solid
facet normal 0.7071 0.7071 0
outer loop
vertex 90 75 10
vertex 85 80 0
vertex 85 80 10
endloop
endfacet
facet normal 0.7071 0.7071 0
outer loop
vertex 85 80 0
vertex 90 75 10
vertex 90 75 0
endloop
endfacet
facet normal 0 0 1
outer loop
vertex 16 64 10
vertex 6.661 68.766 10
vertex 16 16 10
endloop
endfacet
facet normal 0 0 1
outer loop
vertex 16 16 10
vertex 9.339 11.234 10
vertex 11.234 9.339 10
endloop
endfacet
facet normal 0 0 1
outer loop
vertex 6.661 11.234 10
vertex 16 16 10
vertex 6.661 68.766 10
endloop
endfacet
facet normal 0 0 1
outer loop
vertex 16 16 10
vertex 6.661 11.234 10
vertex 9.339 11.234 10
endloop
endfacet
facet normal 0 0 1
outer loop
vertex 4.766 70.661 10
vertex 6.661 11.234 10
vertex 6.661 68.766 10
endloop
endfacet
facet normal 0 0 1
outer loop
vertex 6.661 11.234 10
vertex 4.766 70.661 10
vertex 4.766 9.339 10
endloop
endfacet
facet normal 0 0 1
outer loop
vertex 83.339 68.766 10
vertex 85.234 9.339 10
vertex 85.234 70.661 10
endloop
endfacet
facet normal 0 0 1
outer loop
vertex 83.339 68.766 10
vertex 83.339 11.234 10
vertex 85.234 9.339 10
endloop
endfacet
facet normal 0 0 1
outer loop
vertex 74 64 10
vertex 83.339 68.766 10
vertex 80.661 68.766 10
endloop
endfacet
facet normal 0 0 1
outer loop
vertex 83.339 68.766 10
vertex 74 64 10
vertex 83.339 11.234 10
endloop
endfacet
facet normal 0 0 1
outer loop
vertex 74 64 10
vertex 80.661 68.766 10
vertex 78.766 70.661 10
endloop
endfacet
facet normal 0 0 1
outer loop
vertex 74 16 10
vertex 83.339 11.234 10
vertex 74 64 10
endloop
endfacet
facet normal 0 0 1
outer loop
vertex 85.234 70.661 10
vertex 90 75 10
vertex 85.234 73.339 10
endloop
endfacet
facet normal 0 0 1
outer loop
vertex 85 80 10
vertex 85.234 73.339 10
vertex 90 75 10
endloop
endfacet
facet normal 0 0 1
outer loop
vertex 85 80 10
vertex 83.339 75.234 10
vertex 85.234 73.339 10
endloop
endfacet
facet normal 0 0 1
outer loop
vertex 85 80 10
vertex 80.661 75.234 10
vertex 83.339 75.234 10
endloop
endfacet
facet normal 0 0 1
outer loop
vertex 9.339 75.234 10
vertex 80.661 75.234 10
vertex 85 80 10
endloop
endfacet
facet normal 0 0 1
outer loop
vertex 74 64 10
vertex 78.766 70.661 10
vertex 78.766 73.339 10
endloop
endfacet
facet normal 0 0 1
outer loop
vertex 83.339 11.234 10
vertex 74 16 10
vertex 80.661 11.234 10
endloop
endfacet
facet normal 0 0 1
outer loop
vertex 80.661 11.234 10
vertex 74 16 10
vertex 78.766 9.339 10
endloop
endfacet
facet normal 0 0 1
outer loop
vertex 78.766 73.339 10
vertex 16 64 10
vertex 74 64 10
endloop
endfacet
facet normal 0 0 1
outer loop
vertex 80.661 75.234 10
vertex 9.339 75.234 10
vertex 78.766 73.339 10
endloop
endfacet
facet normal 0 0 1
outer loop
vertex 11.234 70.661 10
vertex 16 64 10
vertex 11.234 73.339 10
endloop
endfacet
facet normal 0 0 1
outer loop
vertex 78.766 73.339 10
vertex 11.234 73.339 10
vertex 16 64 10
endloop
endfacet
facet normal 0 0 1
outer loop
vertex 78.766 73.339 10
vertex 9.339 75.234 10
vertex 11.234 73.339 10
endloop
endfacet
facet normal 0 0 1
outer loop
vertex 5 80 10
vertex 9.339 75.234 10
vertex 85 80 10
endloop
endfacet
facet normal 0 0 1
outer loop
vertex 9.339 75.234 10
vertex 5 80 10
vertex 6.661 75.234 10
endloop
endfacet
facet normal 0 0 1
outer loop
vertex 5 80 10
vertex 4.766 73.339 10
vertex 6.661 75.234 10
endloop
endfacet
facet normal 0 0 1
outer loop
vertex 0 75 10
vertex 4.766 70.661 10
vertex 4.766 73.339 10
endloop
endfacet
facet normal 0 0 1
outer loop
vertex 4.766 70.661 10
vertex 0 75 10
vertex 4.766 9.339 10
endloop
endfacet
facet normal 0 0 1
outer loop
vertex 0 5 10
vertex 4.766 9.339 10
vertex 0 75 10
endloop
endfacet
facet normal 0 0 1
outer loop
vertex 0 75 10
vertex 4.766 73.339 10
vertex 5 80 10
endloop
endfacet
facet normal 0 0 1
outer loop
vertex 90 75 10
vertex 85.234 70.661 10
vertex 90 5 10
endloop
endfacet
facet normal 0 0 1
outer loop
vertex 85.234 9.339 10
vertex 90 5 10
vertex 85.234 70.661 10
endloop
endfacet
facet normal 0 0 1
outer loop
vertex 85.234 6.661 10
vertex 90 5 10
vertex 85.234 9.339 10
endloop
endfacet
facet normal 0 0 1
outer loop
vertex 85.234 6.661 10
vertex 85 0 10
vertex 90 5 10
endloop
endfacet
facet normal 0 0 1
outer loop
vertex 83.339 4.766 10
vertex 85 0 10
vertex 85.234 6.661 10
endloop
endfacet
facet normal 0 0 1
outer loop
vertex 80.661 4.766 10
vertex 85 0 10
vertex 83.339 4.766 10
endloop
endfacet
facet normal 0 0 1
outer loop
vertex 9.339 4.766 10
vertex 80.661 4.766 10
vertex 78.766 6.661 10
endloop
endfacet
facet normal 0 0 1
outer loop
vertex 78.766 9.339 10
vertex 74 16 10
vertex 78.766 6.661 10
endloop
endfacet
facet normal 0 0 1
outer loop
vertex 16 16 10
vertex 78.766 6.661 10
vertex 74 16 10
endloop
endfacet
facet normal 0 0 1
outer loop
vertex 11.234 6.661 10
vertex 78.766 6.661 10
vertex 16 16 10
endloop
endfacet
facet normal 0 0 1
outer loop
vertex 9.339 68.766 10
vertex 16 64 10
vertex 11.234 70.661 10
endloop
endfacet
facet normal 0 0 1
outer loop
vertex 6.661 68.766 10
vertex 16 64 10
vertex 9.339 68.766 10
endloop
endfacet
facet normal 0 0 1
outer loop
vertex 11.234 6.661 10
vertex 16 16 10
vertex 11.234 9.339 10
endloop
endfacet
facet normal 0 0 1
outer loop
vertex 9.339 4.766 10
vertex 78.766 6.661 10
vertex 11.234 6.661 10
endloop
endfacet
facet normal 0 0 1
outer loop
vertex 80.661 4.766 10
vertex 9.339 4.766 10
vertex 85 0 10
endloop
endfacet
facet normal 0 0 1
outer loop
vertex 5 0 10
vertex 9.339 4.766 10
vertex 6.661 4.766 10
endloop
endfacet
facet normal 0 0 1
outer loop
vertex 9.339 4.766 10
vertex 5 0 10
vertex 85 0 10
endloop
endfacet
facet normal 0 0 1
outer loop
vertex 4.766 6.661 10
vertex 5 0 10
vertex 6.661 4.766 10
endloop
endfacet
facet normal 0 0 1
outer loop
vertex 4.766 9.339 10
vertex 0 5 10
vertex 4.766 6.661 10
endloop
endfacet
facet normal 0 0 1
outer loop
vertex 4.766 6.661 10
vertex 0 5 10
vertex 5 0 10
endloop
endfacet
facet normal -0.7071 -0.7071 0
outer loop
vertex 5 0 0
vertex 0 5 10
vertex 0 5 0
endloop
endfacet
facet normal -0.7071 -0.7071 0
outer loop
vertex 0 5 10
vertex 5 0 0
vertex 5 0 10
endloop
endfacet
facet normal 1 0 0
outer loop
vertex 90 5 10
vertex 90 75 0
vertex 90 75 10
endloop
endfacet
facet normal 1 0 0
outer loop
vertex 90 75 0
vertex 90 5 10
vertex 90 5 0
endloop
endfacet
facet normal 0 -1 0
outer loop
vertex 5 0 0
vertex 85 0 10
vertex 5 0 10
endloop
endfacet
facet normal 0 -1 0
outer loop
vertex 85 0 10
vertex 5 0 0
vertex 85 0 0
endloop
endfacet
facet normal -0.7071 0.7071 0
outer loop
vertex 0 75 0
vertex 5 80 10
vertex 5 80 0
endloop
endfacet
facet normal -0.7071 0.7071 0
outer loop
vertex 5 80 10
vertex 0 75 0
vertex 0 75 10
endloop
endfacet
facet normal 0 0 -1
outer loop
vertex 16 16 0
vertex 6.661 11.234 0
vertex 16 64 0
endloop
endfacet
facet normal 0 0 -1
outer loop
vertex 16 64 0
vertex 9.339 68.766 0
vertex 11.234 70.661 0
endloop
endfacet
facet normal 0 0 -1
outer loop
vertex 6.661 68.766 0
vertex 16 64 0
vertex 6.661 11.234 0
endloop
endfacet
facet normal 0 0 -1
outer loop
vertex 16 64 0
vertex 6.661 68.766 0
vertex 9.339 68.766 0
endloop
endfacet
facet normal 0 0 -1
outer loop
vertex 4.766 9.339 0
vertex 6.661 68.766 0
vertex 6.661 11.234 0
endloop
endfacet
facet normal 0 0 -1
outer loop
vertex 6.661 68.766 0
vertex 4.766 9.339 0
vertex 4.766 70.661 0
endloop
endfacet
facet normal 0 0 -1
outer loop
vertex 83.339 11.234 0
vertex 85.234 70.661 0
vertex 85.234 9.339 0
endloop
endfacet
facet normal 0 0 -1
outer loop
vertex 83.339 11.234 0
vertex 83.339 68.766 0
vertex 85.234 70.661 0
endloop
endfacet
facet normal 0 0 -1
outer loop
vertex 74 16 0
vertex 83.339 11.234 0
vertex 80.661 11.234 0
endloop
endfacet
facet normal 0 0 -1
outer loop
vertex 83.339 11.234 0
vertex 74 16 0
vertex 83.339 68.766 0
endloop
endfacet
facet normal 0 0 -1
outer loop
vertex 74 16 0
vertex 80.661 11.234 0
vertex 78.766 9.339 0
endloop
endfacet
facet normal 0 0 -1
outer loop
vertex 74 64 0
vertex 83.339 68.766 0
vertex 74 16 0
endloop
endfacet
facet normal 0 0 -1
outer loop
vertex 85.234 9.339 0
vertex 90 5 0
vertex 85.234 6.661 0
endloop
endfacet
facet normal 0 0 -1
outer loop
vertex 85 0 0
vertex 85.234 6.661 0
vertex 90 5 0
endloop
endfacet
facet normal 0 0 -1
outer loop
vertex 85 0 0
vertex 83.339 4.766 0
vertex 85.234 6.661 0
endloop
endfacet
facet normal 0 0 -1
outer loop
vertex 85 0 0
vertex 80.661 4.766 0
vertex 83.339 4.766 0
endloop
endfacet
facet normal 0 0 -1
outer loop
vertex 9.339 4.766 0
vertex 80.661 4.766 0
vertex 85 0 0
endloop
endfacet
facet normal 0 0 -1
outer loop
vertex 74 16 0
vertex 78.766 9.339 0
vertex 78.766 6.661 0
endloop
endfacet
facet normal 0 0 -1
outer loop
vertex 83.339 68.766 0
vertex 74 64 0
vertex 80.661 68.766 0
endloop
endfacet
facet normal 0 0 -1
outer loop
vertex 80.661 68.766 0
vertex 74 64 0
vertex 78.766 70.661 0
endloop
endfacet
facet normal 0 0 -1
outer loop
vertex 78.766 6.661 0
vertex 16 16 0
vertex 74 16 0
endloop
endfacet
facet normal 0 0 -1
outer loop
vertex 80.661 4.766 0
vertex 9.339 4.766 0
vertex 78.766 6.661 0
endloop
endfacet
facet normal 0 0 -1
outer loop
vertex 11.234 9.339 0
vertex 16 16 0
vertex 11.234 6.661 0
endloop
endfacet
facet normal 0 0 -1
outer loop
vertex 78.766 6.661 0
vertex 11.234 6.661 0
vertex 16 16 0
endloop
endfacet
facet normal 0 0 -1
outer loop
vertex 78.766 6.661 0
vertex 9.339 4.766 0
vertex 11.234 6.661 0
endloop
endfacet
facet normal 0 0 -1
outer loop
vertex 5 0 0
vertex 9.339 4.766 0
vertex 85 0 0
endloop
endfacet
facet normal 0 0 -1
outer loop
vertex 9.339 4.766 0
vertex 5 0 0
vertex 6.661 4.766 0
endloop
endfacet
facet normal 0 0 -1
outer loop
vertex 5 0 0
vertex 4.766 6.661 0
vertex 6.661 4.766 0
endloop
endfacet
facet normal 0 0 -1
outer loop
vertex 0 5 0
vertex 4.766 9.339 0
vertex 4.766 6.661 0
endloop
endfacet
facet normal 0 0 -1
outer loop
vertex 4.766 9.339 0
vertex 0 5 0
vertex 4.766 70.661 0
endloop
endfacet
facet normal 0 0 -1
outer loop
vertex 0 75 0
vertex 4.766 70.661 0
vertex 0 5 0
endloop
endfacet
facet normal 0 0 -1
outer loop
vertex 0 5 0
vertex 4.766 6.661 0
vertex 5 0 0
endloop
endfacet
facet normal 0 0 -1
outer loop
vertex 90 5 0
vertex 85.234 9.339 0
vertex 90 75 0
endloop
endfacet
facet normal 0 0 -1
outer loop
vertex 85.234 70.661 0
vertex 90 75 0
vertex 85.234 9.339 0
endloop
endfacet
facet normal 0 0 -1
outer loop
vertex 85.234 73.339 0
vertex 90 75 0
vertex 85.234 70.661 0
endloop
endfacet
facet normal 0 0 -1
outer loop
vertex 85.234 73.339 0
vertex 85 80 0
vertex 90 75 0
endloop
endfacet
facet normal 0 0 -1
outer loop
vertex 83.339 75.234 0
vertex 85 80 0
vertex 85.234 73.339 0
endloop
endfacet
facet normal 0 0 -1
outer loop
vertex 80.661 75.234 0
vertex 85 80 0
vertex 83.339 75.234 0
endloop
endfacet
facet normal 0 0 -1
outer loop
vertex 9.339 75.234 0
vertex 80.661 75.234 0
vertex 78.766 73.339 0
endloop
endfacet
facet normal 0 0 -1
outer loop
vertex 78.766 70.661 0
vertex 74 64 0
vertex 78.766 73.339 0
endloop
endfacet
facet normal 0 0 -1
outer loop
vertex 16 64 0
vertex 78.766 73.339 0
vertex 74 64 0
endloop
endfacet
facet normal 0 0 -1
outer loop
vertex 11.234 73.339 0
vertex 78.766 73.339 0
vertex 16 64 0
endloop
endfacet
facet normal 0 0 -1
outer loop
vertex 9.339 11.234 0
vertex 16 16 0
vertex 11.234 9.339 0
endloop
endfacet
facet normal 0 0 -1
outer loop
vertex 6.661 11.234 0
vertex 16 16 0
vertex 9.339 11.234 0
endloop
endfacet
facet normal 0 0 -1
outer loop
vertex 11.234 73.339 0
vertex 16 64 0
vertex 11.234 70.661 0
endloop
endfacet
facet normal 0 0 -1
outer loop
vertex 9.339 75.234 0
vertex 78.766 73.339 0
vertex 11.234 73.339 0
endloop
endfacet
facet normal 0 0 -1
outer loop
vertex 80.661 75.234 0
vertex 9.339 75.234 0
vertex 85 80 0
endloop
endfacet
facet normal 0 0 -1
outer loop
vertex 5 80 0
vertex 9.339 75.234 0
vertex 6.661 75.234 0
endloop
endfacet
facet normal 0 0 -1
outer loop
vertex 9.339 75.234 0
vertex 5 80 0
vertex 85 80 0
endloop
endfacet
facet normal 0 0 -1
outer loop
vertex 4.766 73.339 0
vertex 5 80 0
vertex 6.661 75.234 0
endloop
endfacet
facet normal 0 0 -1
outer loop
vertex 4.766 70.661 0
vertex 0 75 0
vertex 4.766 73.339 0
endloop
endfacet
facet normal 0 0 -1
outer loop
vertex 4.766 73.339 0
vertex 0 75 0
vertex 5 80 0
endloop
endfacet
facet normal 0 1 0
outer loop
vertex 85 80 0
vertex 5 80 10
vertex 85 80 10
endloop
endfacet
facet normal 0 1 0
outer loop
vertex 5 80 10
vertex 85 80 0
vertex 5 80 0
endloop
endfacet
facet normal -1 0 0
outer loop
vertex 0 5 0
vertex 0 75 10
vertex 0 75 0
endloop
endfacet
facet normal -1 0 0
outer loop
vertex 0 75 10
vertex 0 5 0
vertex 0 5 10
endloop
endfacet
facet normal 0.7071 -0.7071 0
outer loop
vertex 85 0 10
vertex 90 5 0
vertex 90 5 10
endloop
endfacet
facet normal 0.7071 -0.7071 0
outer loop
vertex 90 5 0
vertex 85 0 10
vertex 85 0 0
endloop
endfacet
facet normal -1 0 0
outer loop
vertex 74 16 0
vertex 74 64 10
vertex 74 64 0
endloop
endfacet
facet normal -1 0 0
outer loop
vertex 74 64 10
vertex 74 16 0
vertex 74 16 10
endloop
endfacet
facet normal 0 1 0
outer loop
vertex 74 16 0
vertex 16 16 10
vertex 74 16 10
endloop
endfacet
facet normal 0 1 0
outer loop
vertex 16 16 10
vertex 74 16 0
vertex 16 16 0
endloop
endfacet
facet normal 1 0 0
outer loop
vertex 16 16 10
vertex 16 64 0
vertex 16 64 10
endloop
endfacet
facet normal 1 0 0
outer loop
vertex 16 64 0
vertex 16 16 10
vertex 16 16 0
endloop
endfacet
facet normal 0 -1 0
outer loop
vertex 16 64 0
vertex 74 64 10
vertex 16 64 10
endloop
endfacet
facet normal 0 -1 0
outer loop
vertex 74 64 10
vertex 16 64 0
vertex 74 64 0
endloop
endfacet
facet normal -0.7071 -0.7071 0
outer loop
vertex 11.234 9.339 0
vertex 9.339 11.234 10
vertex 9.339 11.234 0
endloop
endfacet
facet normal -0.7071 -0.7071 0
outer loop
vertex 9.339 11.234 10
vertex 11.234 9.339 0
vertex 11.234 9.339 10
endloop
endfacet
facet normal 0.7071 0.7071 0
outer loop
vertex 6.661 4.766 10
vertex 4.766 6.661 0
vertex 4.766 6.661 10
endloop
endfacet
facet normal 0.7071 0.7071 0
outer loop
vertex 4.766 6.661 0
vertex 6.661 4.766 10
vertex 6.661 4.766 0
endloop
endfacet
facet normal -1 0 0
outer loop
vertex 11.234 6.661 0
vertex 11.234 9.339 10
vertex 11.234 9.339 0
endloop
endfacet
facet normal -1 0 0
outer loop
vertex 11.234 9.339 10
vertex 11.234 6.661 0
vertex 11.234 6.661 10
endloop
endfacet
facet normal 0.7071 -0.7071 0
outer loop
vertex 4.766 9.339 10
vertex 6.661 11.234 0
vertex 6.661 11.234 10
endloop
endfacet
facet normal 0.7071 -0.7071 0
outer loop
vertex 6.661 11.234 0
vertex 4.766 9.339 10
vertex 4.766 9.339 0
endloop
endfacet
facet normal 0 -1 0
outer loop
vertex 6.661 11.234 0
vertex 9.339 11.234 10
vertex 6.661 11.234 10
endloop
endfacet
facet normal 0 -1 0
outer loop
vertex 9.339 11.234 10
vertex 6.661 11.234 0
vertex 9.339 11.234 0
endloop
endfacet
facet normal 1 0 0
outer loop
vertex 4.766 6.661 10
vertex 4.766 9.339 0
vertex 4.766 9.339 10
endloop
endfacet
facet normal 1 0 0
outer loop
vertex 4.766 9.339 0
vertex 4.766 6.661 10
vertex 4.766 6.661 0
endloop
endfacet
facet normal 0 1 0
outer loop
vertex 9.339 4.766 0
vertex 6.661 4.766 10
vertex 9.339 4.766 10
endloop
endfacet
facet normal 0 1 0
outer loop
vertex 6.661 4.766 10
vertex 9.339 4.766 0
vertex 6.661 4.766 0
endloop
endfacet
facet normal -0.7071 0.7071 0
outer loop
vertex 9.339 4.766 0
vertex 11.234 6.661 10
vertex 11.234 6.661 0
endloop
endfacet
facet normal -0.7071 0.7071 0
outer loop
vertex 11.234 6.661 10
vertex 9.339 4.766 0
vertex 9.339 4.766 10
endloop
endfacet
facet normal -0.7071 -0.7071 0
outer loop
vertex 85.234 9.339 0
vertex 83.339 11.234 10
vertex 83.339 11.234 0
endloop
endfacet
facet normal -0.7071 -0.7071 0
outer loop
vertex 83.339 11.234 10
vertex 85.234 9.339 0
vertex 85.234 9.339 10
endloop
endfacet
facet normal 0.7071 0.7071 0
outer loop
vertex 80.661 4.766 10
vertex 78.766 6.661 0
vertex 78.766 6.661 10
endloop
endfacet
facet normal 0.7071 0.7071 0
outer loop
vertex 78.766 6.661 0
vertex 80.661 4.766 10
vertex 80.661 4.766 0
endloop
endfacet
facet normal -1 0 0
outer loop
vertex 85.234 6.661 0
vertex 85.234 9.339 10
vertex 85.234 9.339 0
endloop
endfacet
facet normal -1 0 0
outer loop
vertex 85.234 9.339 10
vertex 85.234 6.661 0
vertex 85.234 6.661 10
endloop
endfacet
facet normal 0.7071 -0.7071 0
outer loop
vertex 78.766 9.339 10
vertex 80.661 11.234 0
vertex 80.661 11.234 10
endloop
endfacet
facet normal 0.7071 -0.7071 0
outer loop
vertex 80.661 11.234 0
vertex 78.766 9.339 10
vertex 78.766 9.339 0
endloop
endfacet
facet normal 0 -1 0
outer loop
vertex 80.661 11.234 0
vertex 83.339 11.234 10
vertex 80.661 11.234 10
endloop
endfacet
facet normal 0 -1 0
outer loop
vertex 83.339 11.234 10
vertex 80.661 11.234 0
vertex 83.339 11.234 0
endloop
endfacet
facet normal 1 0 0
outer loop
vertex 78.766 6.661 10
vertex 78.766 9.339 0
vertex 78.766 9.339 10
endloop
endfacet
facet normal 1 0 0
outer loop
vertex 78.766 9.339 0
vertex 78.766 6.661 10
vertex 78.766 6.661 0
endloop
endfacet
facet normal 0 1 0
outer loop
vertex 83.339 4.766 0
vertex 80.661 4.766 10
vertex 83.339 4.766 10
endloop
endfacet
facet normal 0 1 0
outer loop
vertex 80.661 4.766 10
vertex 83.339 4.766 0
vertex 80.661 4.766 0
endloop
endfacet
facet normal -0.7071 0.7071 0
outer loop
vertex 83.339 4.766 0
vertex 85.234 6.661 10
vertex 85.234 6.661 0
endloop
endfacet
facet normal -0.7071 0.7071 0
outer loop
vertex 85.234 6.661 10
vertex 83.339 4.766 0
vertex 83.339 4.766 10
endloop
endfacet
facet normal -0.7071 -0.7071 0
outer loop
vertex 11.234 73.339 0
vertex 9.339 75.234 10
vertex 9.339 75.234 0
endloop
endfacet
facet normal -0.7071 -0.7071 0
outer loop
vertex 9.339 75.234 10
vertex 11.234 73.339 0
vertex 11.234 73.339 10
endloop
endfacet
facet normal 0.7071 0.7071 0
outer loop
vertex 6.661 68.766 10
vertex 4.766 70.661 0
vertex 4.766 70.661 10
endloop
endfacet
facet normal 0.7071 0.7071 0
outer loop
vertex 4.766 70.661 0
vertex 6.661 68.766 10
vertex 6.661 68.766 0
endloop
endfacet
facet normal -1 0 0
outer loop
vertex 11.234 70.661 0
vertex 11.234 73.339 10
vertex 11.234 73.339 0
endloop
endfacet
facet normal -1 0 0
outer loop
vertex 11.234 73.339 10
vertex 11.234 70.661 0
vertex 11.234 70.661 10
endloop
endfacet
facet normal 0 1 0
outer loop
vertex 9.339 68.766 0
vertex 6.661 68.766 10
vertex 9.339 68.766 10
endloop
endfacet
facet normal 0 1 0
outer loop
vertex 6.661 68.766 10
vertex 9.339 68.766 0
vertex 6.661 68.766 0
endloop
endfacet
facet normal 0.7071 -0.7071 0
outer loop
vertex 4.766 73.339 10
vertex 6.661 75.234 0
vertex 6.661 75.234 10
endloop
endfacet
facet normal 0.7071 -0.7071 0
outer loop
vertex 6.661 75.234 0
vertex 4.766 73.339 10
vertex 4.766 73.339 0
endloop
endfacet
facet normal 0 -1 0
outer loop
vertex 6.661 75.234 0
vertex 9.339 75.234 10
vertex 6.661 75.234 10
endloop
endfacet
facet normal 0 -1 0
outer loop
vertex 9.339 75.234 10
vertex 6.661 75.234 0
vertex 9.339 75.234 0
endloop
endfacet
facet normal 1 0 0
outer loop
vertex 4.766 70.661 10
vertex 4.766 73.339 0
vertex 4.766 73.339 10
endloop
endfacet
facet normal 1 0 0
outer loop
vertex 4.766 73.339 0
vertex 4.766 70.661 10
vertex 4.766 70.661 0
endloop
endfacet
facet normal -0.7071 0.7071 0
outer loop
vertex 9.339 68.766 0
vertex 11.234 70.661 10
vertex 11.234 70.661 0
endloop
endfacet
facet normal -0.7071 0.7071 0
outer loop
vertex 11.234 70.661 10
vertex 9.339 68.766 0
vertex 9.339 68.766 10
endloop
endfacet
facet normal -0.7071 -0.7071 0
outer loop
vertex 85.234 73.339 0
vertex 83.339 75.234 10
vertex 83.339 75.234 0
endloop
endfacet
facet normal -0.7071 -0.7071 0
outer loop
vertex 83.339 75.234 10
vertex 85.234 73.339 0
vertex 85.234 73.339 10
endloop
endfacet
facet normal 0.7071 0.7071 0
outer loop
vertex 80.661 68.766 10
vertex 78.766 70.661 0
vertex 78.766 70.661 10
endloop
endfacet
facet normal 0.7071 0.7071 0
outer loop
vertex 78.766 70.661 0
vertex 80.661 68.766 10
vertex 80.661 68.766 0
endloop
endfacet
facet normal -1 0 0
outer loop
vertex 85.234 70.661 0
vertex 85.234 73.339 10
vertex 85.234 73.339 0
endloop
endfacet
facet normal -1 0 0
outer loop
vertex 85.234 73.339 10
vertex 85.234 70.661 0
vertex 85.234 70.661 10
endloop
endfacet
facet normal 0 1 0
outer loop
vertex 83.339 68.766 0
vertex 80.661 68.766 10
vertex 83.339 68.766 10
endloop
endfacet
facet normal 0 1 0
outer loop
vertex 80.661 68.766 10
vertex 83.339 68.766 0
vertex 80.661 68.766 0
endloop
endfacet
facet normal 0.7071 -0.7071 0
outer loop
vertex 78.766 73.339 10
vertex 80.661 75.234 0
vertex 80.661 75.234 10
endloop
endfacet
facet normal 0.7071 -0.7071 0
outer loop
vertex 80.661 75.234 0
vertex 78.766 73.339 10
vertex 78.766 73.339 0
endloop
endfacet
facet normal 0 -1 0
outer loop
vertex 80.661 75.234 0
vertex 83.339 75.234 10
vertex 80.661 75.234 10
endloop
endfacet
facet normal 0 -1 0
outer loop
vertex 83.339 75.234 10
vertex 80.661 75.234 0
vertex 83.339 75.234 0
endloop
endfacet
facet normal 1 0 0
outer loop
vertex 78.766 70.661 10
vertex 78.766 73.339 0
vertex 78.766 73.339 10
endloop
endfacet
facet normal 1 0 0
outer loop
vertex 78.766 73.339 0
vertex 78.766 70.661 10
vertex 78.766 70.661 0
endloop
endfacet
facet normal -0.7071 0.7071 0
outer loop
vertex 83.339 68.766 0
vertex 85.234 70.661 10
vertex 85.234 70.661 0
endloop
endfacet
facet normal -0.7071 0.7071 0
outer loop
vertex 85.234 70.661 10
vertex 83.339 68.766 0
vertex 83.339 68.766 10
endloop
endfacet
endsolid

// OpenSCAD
$fn = 32;

// ----------------------------------------------------------------------
// Frame plate: 90 x 80 frame, 16 mm rails
// ----------------------------------------------------------------------

// --- parameters (mm) ---
plate_l = 90;             // plate length, X
plate_w = 80;             // plate width, Y
plate_t = 10;             // plate thickness, Z (extrusion height)
corner_c = 5;             // corner chamfer
frame_bar = 16;           // frame rail width
bolt_r = 3.5;             // corner bolt window radius
bolt_inset = 8;           // bolt centre inset from the edges

win_l = plate_l - 2 * frame_bar;  // window length
win_w = plate_w - 2 * frame_bar;  // window width
bolt_d = 2 * bolt_r;  // corner hole diameter

profile = [[5, 0], [85, 0], [90, 5], [90, 75], [85, 80], [5, 80], [0, 75], [0, 5]];  // primary outline, 8 points, counter clockwise
void_1 = [[16, 16], [74, 16], [74, 64], [16, 64]];  // the window, 4 points
void_2 = [[11.234, 9.339], [9.339, 11.234], [6.661, 11.234], [4.766, 9.339], [4.766, 6.661], [6.661, 4.766], [9.339, 4.766], [11.234, 6.661]];  // corner bolt window, 8 points
void_3 = [[85.234, 9.339], [83.339, 11.234], [80.661, 11.234], [78.766, 9.339], [78.766, 6.661], [80.661, 4.766], [83.339, 4.766], [85.234, 6.661]];  // corner bolt window, 8 points
void_4 = [[11.234, 73.339], [9.339, 75.234], [6.661, 75.234], [4.766, 73.339], [4.766, 70.661], [6.661, 68.766], [9.339, 68.766], [11.234, 70.661]];  // corner bolt window, 8 points
void_5 = [[85.234, 73.339], [83.339, 75.234], [80.661, 75.234], [78.766, 73.339], [78.766, 70.661], [80.661, 68.766], [83.339, 68.766], [85.234, 70.661]];  // corner bolt window, 8 points

// --- the one profile operation ---
difference() {
  linear_extrude(height = plate_t) polygon(points = profile);
  translate([0, 0, -1])
    linear_extrude(height = plate_t + 2) polygon(points = void_1);
  translate([0, 0, -1])
    linear_extrude(height = plate_t + 2) polygon(points = void_2);
  translate([0, 0, -1])
    linear_extrude(height = plate_t + 2) polygon(points = void_3);
  translate([0, 0, -1])
    linear_extrude(height = plate_t + 2) polygon(points = void_4);
  translate([0, 0, -1])
    linear_extrude(height = plate_t + 2) polygon(points = void_5);
}
